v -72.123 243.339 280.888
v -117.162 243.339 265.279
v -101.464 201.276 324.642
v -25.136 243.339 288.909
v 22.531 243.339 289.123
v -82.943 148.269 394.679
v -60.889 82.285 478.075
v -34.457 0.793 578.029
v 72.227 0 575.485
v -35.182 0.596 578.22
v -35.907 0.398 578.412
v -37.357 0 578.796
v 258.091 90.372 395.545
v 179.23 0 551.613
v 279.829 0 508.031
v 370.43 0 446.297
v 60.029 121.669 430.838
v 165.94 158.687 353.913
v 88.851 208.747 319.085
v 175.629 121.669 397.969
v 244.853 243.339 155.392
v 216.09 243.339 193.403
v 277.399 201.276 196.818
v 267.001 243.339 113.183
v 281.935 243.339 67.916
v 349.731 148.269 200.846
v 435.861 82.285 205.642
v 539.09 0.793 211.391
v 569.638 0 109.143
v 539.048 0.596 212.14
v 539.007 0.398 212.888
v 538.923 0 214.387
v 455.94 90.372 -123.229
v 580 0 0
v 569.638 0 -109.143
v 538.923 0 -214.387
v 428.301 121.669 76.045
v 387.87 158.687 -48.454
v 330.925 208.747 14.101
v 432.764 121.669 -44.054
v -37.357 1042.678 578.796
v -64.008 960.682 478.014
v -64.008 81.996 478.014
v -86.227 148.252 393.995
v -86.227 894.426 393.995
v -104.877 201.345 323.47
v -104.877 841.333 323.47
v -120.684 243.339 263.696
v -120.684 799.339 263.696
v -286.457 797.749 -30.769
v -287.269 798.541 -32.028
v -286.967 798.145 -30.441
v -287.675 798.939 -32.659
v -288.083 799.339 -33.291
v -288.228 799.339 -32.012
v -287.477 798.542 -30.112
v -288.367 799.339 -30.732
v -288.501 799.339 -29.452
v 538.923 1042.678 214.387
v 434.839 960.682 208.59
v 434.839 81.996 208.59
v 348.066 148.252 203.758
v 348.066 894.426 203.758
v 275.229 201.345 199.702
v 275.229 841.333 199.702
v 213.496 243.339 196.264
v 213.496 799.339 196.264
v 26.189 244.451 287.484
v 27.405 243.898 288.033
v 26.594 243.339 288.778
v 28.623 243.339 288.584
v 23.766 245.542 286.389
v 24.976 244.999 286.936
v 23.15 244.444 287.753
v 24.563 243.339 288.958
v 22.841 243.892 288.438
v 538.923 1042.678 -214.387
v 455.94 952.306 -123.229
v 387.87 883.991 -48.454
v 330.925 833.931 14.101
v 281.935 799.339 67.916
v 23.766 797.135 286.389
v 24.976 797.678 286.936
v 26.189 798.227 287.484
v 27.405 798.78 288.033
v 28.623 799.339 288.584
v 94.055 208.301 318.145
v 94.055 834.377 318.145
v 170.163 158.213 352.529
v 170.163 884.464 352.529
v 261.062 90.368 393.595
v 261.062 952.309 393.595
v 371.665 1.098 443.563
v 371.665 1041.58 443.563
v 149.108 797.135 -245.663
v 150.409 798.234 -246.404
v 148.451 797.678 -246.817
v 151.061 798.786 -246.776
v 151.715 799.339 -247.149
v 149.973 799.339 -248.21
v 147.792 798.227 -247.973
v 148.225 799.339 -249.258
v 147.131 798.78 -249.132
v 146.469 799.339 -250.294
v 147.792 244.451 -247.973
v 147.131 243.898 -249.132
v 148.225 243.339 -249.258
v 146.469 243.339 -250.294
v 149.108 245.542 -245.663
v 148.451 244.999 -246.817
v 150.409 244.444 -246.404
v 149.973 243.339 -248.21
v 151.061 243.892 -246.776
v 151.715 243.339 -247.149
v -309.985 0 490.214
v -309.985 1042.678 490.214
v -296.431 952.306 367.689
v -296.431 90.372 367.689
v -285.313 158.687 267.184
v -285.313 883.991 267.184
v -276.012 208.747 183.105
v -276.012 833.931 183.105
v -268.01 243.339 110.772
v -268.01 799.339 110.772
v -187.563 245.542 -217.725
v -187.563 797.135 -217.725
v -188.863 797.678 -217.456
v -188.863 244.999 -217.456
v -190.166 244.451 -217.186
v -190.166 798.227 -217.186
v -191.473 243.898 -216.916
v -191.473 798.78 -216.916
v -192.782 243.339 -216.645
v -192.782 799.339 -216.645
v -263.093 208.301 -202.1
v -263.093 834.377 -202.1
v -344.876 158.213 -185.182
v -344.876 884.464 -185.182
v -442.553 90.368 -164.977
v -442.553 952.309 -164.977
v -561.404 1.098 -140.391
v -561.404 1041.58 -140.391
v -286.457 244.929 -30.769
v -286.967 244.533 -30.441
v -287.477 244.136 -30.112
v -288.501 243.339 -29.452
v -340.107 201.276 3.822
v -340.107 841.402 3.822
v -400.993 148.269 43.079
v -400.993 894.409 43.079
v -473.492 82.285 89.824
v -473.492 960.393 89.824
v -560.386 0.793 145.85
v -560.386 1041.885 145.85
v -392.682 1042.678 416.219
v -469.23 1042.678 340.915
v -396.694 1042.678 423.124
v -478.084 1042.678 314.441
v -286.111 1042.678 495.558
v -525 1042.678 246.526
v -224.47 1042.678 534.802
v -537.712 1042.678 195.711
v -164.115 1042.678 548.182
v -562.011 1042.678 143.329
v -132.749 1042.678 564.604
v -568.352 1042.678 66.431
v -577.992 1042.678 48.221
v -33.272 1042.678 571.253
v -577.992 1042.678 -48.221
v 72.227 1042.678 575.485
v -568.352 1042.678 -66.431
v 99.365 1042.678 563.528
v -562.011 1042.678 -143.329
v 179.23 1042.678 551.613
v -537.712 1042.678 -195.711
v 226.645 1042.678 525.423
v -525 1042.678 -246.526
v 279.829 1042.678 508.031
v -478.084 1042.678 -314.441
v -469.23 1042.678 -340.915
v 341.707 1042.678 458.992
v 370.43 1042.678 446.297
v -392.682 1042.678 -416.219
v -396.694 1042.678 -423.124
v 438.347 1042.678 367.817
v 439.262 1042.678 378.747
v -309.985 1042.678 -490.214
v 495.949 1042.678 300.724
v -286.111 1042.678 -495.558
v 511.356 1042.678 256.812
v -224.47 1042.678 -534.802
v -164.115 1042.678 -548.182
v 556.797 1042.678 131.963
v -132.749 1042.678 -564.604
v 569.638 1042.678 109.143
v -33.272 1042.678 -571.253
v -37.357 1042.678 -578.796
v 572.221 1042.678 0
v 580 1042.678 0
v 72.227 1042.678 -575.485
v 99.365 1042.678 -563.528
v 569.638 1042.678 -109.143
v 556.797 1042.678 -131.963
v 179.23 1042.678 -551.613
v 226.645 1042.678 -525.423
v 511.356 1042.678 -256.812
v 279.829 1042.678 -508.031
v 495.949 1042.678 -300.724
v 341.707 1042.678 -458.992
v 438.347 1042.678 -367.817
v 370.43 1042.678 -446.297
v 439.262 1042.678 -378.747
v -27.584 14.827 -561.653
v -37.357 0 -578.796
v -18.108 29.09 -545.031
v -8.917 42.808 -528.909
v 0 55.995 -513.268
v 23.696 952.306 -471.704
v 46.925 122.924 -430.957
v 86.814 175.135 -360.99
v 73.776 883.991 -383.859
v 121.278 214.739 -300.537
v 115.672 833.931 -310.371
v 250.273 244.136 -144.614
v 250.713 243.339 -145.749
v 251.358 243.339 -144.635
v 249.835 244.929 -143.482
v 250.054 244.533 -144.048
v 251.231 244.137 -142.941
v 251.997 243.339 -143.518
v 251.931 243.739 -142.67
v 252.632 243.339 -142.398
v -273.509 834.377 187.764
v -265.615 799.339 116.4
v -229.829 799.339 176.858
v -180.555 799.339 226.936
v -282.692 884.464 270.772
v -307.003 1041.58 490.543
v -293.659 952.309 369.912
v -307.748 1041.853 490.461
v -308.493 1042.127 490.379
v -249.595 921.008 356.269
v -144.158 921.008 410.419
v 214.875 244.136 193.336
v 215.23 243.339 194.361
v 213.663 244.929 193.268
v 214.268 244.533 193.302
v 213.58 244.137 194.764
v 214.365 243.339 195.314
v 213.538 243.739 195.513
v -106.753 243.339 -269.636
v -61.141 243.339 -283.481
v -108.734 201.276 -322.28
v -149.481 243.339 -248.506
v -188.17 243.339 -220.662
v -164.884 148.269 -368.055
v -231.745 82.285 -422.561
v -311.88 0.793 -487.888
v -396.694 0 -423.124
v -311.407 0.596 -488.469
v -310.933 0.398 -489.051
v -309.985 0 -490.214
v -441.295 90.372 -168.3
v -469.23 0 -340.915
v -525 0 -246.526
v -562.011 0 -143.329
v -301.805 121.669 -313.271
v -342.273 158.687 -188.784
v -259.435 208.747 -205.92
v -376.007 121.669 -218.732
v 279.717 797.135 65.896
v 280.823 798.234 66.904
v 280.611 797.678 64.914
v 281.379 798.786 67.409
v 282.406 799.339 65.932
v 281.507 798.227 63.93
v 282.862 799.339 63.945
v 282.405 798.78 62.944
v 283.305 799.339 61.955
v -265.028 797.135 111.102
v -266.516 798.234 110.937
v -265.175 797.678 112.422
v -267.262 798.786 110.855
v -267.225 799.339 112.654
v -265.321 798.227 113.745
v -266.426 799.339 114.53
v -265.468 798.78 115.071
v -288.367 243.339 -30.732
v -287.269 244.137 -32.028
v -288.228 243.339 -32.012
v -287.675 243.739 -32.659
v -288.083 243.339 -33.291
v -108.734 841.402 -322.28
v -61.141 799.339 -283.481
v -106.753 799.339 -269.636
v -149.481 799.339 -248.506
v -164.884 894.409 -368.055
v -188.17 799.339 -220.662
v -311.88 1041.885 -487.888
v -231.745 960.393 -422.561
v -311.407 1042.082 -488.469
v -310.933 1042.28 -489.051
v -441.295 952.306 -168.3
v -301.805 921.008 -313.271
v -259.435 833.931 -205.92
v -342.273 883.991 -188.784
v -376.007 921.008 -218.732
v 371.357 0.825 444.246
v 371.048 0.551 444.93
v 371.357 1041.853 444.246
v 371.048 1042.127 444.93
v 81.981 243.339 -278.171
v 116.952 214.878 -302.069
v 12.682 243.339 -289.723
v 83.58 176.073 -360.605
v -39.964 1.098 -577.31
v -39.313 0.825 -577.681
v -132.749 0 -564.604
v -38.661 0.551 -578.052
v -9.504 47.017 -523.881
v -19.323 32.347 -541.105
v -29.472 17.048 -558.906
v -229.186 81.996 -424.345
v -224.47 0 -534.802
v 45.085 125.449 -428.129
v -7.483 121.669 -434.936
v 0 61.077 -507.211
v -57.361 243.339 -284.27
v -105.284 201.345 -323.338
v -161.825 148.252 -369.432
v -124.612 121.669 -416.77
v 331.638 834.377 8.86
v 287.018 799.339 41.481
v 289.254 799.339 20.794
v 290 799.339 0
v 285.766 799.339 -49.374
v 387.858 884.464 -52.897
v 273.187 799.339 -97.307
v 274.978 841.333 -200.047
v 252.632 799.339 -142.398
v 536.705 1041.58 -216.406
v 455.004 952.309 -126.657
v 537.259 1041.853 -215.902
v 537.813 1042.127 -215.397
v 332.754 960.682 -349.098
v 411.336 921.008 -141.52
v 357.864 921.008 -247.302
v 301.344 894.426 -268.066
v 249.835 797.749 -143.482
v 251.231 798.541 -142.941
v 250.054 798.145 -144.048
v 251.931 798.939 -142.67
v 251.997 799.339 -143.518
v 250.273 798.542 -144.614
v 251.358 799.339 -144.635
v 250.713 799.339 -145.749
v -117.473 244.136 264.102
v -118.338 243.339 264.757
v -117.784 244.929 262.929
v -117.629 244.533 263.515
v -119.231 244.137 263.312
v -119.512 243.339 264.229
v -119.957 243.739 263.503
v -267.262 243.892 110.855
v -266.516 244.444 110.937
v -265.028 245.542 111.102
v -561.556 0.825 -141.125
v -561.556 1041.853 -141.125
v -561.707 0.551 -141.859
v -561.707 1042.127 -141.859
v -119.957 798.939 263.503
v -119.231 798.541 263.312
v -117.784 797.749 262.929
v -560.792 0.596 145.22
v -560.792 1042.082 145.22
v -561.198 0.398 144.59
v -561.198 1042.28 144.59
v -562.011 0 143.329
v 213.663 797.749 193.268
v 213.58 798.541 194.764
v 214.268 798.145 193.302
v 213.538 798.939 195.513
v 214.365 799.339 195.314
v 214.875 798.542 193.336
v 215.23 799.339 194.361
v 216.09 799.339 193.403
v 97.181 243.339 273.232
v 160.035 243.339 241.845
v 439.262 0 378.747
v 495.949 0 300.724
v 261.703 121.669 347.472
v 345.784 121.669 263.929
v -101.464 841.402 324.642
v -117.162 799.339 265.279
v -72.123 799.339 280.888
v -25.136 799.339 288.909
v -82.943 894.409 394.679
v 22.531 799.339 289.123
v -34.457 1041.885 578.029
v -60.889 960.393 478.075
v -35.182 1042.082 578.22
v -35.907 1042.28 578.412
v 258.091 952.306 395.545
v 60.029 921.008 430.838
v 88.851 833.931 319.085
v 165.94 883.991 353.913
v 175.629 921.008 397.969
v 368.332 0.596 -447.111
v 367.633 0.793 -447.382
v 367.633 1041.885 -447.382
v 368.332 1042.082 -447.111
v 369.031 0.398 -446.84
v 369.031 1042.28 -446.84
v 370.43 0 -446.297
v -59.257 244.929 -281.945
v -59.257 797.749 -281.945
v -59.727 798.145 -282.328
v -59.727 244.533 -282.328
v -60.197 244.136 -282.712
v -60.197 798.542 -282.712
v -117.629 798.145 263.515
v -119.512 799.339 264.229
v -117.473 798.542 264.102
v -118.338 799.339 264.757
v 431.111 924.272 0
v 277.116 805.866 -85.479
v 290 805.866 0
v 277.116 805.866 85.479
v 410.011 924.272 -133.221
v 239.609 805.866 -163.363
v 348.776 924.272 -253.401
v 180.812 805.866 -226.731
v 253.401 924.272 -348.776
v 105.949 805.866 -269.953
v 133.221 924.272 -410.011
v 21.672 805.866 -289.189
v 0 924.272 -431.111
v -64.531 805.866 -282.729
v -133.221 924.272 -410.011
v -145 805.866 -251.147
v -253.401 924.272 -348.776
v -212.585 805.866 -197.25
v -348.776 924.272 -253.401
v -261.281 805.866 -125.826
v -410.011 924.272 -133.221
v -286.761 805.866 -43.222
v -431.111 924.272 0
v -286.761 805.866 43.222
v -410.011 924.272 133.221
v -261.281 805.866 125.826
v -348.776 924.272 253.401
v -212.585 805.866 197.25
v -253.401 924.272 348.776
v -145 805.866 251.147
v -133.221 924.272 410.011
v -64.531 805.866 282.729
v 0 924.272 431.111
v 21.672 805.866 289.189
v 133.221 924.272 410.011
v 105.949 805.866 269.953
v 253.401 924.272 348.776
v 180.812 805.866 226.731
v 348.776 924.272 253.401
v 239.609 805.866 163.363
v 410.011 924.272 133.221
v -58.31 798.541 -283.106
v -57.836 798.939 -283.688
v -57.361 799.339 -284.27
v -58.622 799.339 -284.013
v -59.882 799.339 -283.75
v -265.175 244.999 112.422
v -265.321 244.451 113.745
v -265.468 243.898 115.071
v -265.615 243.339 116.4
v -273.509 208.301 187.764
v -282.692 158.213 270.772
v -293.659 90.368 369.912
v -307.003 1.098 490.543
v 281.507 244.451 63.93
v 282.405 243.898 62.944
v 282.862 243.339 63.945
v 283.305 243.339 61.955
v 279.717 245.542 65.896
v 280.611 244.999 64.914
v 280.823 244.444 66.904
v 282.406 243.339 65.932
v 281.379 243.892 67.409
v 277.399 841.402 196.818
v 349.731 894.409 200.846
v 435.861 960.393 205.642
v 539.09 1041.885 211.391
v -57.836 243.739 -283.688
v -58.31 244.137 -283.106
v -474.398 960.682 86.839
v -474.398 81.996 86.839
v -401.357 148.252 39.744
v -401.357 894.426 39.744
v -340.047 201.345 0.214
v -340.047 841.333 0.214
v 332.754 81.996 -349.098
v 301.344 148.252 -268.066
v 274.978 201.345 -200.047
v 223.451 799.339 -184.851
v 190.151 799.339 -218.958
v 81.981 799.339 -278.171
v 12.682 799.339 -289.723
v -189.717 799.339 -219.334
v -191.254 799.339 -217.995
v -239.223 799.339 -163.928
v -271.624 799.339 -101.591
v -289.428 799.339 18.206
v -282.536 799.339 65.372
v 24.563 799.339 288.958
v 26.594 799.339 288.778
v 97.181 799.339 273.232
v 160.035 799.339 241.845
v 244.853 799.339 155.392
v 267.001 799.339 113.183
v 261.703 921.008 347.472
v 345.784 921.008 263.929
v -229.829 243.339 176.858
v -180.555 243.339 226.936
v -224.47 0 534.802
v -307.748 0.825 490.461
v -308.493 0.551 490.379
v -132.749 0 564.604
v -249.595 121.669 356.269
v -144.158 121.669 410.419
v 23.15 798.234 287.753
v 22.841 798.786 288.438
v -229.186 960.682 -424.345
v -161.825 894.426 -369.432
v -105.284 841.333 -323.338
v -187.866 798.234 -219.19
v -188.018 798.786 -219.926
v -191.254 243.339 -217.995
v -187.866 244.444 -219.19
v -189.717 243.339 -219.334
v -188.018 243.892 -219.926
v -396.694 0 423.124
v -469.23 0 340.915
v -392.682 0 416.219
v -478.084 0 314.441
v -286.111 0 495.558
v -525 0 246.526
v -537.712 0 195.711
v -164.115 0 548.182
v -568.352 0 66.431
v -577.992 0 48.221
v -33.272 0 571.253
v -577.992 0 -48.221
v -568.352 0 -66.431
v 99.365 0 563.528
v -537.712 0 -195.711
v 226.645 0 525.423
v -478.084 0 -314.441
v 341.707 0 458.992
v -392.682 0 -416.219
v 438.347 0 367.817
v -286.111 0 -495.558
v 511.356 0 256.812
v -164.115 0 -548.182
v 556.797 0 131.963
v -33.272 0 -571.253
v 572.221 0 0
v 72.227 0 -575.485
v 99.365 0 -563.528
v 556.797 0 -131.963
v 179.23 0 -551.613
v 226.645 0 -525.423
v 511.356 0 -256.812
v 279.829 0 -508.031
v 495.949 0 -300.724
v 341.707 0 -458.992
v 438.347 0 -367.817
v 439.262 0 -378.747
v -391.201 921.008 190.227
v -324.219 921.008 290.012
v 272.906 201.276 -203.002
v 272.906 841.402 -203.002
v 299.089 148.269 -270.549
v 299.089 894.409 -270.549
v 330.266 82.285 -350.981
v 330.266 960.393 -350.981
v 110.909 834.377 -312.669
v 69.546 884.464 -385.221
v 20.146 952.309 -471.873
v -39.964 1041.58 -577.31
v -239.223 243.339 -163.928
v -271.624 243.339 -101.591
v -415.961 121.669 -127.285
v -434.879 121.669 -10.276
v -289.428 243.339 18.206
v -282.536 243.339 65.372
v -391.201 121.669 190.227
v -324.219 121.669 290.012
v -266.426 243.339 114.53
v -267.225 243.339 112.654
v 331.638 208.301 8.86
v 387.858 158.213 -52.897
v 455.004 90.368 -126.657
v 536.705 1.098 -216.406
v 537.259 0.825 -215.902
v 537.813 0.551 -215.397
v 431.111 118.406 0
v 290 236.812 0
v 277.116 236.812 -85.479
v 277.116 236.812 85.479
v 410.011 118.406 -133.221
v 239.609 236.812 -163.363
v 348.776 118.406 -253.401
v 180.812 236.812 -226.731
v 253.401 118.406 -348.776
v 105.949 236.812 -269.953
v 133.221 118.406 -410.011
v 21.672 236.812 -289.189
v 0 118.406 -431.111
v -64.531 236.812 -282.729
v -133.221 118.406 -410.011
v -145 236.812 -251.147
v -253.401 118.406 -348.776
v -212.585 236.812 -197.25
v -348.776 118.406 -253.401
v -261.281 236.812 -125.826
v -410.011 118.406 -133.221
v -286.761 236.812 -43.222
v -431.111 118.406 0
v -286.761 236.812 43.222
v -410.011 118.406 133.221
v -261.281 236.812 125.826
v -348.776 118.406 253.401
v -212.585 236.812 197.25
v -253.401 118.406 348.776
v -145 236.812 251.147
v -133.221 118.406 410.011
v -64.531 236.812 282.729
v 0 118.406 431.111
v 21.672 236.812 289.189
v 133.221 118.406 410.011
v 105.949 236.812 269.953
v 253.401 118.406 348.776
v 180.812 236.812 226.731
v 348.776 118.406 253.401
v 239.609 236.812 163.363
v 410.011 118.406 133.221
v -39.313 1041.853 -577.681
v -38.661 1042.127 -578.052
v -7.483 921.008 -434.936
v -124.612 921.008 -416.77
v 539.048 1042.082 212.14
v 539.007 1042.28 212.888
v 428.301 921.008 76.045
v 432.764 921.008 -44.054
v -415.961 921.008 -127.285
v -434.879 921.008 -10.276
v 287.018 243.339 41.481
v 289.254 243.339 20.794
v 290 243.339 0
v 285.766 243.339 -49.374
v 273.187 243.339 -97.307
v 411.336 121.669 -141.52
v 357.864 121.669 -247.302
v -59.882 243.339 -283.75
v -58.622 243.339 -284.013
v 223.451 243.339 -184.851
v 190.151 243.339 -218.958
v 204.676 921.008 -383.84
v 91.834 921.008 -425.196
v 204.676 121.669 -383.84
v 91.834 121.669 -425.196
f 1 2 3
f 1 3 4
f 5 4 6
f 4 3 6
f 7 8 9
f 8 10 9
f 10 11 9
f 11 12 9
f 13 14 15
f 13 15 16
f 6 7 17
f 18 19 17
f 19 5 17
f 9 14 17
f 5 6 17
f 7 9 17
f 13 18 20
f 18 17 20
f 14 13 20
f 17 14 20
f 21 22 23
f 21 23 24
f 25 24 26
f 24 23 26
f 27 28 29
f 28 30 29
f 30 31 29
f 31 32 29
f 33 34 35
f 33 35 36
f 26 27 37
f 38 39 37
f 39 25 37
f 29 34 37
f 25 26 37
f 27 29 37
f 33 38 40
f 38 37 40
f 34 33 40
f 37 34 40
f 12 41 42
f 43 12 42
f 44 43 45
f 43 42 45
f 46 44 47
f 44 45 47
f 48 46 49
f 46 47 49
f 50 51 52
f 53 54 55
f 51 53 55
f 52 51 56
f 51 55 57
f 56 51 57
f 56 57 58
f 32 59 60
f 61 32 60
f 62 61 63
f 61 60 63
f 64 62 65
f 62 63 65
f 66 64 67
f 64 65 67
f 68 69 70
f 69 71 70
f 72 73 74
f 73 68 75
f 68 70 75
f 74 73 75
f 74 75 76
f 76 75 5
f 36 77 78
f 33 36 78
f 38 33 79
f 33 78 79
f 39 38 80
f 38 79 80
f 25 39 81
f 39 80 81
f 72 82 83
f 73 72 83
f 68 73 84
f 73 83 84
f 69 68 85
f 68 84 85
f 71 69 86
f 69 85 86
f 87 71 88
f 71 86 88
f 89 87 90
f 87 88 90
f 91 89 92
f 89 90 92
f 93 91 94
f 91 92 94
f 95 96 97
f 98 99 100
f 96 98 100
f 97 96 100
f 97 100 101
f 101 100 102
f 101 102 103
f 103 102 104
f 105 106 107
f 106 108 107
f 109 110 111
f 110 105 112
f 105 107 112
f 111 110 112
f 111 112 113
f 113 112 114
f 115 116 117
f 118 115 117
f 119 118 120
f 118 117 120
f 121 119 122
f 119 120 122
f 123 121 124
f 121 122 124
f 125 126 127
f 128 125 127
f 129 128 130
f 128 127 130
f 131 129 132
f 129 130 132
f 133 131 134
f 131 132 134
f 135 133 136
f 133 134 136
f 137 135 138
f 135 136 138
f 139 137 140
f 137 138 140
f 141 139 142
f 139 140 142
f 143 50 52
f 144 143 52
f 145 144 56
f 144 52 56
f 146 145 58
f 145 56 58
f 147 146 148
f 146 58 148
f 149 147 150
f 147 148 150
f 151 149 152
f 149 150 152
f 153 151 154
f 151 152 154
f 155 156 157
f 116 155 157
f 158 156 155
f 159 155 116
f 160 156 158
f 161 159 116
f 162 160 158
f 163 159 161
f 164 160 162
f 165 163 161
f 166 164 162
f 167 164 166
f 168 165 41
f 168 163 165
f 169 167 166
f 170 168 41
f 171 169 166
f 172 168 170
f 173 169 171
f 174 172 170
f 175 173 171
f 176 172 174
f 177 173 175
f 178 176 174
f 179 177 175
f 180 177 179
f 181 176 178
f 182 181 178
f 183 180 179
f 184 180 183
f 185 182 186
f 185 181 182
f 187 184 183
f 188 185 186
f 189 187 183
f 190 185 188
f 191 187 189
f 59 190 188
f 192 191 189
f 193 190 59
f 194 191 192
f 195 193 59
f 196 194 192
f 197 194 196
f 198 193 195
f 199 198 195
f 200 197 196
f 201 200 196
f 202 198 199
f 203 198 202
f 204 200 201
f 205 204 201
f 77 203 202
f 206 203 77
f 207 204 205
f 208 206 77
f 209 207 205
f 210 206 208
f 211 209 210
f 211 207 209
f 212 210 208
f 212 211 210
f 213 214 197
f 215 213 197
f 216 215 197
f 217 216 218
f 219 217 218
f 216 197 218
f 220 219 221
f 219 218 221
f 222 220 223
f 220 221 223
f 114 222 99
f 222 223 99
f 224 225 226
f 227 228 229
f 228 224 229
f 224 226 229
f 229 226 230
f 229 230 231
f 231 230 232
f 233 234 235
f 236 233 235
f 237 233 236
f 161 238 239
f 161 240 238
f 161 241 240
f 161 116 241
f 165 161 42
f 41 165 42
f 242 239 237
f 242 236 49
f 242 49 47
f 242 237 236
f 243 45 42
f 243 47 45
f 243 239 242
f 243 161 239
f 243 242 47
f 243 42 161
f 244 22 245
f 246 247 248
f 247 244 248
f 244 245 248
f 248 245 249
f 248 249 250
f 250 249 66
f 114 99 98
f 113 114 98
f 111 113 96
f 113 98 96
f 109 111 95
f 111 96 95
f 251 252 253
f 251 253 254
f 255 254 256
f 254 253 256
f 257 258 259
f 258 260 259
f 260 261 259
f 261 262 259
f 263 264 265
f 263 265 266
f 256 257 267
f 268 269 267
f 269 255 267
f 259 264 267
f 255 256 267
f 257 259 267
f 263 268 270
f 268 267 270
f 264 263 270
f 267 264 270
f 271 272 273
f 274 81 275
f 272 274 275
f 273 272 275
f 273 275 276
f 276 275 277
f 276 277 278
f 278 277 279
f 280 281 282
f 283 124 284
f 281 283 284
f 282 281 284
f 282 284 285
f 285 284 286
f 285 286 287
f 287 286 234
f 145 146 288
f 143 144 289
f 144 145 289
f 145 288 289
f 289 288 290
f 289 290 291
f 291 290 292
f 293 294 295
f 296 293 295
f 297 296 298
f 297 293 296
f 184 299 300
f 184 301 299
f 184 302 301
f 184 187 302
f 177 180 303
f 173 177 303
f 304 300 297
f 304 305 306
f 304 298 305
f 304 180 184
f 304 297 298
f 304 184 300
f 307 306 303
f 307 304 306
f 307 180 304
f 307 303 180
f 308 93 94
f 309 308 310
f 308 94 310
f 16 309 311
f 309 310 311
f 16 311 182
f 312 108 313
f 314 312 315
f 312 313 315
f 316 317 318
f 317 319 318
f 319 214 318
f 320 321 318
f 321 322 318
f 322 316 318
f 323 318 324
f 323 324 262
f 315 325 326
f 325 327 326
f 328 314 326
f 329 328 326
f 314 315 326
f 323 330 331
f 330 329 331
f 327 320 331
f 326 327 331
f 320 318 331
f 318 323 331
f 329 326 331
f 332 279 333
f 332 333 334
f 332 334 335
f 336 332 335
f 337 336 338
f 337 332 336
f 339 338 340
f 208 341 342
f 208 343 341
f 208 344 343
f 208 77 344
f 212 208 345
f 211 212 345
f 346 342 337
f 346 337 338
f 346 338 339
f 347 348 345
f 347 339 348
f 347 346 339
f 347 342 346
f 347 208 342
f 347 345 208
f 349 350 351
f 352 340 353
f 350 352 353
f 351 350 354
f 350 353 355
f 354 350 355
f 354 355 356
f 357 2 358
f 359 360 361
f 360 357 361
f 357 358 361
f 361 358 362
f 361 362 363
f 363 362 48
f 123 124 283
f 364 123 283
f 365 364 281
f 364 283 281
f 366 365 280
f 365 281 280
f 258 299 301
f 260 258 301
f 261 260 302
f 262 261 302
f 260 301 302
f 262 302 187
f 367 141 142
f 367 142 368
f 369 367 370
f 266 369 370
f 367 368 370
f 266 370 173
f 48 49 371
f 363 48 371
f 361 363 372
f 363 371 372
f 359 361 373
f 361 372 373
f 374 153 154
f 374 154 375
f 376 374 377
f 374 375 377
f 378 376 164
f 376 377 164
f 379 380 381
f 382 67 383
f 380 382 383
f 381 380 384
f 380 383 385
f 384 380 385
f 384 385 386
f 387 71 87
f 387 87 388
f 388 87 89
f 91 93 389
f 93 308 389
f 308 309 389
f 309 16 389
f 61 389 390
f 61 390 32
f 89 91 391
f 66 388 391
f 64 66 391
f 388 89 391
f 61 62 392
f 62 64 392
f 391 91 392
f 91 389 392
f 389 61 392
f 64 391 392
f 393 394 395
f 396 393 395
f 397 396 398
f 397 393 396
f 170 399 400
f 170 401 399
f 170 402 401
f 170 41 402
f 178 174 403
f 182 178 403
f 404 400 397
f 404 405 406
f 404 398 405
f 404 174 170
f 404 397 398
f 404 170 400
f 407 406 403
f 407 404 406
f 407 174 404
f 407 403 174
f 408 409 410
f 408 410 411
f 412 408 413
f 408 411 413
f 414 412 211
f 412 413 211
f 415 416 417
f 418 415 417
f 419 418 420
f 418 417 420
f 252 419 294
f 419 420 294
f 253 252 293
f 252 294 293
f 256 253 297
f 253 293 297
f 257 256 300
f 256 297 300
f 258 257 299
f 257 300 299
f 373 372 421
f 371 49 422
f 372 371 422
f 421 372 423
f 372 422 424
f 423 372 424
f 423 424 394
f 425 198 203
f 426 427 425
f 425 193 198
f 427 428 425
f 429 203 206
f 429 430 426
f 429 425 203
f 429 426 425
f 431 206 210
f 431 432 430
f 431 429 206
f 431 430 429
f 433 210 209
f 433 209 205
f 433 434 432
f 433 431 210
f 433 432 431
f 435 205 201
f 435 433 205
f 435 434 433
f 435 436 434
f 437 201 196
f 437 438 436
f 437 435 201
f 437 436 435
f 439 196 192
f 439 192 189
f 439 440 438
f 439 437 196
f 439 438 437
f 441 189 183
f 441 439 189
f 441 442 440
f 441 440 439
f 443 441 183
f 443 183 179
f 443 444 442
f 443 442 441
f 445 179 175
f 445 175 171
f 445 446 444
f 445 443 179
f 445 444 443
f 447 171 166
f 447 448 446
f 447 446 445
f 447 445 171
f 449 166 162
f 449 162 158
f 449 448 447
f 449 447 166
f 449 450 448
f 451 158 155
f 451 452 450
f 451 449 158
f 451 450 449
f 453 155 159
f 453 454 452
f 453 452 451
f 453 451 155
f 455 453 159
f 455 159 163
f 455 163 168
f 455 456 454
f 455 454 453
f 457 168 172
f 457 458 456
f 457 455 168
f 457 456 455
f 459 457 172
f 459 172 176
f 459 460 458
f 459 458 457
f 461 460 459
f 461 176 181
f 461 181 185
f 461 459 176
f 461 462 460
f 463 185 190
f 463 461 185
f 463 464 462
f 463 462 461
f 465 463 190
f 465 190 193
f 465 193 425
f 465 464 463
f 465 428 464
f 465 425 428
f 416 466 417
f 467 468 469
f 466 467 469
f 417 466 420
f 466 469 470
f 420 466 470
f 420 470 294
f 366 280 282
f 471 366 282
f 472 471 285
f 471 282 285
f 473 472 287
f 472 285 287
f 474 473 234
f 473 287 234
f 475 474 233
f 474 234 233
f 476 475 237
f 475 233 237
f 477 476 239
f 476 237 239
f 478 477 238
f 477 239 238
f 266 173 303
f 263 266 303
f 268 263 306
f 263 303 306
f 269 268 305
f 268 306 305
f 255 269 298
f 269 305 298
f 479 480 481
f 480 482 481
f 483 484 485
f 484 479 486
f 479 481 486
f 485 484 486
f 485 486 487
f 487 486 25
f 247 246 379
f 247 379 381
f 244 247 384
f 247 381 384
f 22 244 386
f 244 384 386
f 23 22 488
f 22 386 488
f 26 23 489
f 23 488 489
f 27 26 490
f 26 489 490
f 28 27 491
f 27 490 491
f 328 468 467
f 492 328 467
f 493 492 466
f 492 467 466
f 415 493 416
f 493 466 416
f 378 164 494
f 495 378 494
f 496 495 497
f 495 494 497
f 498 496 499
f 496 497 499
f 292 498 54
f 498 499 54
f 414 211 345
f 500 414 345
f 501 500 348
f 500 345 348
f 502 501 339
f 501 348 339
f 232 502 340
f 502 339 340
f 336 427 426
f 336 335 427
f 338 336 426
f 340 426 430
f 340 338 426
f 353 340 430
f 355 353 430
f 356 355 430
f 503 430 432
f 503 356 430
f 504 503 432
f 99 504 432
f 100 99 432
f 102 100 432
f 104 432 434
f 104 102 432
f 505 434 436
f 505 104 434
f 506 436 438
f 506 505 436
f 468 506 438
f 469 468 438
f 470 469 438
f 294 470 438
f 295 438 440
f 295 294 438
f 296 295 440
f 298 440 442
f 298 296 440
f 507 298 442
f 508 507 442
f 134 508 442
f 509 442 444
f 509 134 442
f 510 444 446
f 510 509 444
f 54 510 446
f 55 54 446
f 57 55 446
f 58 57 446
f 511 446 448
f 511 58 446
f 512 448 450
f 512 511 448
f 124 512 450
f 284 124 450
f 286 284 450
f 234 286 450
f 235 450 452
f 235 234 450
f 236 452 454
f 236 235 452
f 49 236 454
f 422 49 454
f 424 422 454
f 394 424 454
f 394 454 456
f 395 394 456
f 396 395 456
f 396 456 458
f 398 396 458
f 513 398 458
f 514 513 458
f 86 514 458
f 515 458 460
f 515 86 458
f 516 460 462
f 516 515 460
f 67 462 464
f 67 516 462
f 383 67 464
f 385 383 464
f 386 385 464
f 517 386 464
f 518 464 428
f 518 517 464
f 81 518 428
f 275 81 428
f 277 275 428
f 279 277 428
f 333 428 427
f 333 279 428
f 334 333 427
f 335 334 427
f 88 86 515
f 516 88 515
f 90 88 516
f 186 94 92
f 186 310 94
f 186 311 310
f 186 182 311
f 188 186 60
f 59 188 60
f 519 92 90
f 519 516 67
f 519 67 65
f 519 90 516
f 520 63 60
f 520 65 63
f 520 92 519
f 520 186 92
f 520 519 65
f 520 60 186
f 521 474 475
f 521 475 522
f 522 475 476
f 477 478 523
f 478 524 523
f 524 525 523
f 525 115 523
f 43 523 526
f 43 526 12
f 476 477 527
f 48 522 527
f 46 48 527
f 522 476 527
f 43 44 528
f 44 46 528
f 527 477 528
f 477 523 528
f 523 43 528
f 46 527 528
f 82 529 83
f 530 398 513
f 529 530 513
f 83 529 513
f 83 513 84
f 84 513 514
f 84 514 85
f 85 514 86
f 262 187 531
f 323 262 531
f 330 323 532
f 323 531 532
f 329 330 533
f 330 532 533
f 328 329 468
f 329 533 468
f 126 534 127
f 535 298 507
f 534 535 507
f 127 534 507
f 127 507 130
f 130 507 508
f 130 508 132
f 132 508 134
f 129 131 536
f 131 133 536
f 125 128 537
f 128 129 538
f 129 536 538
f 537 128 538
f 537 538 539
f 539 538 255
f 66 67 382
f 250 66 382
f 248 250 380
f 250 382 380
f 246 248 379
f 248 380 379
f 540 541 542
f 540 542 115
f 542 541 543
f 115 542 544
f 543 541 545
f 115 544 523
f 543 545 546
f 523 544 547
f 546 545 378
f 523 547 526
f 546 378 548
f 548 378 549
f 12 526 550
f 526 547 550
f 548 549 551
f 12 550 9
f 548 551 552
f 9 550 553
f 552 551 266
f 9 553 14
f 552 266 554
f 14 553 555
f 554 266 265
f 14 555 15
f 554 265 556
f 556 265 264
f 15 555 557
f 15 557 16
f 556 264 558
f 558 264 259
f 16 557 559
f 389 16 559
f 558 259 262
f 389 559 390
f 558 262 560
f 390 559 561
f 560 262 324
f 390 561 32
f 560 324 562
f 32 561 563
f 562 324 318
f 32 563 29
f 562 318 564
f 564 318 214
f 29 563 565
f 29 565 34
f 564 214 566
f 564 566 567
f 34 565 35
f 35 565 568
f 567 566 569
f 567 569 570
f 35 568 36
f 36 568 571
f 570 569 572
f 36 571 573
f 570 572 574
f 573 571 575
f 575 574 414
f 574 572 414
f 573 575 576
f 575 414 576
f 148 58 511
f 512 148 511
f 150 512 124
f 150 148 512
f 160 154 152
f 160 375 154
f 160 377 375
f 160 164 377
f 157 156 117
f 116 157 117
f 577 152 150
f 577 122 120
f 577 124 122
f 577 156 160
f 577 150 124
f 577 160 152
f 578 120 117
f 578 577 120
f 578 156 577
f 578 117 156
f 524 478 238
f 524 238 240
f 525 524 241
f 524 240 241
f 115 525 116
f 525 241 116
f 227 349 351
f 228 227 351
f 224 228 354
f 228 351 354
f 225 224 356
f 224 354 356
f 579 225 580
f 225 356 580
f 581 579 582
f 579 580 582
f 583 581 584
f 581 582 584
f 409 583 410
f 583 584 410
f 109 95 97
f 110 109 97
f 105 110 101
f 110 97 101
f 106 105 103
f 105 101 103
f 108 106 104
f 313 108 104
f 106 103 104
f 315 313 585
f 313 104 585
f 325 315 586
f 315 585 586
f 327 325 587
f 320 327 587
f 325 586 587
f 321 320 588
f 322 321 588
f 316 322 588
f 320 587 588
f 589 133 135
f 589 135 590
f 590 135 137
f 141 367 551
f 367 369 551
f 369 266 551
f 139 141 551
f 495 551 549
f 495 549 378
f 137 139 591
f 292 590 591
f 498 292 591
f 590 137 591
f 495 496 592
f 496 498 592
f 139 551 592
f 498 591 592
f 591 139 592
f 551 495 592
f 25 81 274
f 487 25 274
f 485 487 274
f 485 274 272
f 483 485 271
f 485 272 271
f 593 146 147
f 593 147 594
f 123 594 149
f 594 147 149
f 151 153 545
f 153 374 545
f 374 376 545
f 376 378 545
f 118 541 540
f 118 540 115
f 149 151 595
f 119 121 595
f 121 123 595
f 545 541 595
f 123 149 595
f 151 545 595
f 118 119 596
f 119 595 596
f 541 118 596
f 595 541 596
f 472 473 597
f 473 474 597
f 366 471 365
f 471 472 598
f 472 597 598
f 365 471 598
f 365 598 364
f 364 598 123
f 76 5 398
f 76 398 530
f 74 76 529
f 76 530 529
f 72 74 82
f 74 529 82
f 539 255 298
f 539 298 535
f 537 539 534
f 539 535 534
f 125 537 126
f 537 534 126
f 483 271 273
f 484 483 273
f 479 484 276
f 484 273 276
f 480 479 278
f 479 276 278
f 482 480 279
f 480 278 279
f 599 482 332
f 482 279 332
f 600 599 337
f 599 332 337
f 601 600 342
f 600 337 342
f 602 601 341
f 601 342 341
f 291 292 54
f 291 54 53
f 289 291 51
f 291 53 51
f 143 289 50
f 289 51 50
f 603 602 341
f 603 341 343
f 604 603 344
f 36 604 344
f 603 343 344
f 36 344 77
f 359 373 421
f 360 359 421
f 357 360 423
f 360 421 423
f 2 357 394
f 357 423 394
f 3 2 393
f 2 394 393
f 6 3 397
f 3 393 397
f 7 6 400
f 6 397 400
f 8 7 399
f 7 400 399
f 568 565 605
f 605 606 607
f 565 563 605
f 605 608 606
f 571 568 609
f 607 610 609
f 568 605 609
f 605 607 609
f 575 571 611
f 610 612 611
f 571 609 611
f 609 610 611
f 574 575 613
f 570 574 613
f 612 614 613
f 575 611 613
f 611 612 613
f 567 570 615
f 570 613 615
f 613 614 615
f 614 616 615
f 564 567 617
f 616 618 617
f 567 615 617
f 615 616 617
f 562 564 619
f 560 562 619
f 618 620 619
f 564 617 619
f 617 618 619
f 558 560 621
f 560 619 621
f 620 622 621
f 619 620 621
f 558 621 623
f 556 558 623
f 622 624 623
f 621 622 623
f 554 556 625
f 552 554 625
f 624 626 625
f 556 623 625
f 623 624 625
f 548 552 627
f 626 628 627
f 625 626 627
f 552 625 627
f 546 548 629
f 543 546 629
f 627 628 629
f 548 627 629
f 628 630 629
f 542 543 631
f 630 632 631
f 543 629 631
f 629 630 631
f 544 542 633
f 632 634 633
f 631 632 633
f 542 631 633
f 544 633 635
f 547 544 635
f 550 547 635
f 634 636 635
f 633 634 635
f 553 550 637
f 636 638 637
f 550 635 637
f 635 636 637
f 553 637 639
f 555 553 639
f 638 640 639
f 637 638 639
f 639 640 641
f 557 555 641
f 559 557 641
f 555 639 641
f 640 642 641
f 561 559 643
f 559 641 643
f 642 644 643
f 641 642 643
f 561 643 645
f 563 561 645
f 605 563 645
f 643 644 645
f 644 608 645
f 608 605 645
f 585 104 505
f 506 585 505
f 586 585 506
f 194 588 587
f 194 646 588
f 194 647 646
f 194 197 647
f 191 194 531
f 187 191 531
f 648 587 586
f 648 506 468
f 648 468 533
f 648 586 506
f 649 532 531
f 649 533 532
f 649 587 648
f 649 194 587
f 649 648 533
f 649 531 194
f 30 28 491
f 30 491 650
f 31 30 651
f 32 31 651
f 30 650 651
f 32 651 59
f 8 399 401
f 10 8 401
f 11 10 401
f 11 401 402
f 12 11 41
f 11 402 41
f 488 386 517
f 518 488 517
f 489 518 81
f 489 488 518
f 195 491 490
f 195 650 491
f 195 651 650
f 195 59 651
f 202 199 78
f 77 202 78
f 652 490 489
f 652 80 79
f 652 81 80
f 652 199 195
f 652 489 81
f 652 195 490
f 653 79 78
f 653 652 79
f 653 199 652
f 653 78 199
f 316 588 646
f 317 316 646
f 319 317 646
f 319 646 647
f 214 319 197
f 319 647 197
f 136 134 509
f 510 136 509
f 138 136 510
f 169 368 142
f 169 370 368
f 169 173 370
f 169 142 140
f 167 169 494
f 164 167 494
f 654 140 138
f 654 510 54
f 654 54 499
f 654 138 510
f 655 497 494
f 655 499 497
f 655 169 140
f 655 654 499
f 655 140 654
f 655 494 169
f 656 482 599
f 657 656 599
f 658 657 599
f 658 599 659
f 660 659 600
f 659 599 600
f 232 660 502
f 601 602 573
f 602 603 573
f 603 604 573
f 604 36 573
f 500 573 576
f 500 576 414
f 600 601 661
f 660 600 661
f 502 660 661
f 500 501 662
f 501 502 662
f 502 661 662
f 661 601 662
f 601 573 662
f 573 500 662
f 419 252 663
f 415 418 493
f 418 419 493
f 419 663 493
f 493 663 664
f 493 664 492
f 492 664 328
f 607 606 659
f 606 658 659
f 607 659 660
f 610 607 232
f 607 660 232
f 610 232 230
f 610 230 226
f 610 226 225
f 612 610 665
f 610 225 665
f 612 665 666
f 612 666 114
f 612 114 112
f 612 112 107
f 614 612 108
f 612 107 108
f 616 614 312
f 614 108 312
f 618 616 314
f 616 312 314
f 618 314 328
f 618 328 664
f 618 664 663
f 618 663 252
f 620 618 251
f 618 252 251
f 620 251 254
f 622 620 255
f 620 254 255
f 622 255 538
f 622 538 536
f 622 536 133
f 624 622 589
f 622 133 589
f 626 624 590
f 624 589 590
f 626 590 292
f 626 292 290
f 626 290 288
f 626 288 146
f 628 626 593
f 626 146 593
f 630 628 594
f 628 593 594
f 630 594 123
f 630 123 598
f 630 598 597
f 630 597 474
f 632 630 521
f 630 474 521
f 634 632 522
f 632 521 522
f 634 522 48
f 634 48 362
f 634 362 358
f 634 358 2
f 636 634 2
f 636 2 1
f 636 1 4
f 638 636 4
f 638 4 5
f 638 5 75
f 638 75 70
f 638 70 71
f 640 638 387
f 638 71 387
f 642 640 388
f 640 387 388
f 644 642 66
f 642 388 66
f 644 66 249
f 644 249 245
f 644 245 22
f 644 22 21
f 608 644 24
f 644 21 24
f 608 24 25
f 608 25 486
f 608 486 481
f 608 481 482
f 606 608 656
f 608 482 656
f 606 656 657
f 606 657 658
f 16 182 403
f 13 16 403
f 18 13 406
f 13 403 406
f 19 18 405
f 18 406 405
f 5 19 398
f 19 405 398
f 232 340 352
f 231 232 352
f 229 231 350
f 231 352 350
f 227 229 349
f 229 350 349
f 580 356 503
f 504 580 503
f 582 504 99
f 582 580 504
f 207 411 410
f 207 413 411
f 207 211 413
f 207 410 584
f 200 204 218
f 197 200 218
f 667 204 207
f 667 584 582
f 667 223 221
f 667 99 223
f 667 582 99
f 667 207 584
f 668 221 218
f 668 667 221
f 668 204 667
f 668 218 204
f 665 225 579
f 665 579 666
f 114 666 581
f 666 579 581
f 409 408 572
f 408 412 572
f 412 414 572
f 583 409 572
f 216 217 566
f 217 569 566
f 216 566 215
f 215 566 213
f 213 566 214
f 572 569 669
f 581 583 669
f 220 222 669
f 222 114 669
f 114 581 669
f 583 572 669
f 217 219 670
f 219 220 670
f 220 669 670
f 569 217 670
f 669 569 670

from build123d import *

# Parameters (mm, degrees)
SALIENTE_EXTRUIR1_REACH             = 1008.239
SALIENTE_EXTRUIR1_DIRECTION_2_REACH = 1008.239


with BuildPart() as part:
    # Croquis2 → Revolución1 (revolve)
    with BuildSketch(Plane.XY, mode=Mode.PRIVATE) as revoluci_n1_sk:
        Polygon((-572.221380866, 0), (-290, 236.811856595), (-290, 243.338893041), (-580, 0), align=None)
        Polygon((-290, 799.338893041), (-580, 1042.677786083), (-572.221380866, 1042.677786083), (-290, 805.865929488), align=None)
    revolve(revoluci_n1_sk.sketch.rotate(Axis((0, 243.338893041, 0), (0, 1, 0)), 180), axis=Axis((0, 243.338893041, 0), (0, 1, 0)))

    # Saliente-Extruir1: up to this cone (the profile starts outside it)
    saliente_extruir1_end = Plane(origin=(0, 459.825, 0), z_dir=(0, 1, 0)).offset(96.175001) * Cone(1.192e-06, 1087.551425472, 912.563999, align=(Align.CENTER, Align.CENTER, Align.MIN), mode=Mode.PRIVATE)
    # Croquis3 → Saliente-Extruir1 (add, up to the surface)
    with BuildSketch(Plane(origin=(0, 459.825, 0), x_dir=(1, 0, 0), z_dir=(0, 1, 0)), mode=Mode.PRIVATE) as saliente_extruir1_sk1:
        Polygon((-562.011449548, 143.32875), (-188.170333372, 220.662469937), (-187.562612401, 217.724668851), (-561.403728577, 140.390948914), align=None)
    saliente_extruir1_tool1 = extrude(saliente_extruir1_sk1.sketch, amount=SALIENTE_EXTRUIR1_REACH, mode=Mode.PRIVATE) - saliente_extruir1_end
    add(saliente_extruir1_tool1.solids().sort_by_distance((-374.787031, 459.825, -180.526709))[0])
    # Croquis3 → Saliente-Extruir1 (add, up to the surface)
    with BuildSketch(Plane(origin=(0, 459.825, 0), x_dir=(1, 0, 0), z_dir=(0, 1, 0)), mode=Mode.PRIVATE) as saliente_extruir1_sk2:
        Polygon((-562.011449548, -143.32875), (-288.082841539, 33.290785673), (-286.457166797, 30.76944047), (-560.385774807, -145.850095203), align=None)
    saliente_extruir1_tool2 = extrude(saliente_extruir1_sk2.sketch, amount=SALIENTE_EXTRUIR1_REACH, mode=Mode.PRIVATE) - saliente_extruir1_end
    add(saliente_extruir1_tool2.solids().sort_by_distance((-424.234308, 459.825, 56.279655))[0])
    # Croquis3 → Saliente-Extruir1 (add, up to the surface)
    with BuildSketch(Plane(origin=(0, 459.825, 0), x_dir=(1, 0, 0), z_dir=(0, 1, 0)), mode=Mode.PRIVATE) as saliente_extruir1_sk3:
        Polygon((151.714649086, 247.149074958), (149.108430327, 245.663267507), (-39.963566042, 577.309863406), (-37.357347284, 578.795670858), align=None)
    saliente_extruir1_tool3 = extrude(saliente_extruir1_sk3.sketch, amount=SALIENTE_EXTRUIR1_REACH, mode=Mode.PRIVATE) - saliente_extruir1_end
    add(saliente_extruir1_tool3.solids().sort_by_distance((55.875542, 459.825, -412.229469))[0])
    # Croquis3 → Saliente-Extruir1 (add, up to the surface)
    with BuildSketch(Plane(origin=(0, 459.825, 0), x_dir=(1, 0, 0), z_dir=(0, 1, 0)), mode=Mode.PRIVATE) as saliente_extruir1_sk4:
        Polygon((-309.984830604, 490.213631793), (-57.361075176, 284.270482208), (-59.256655839, 281.945235135), (-311.880411267, 487.88838472), align=None)
    saliente_extruir1_tool4 = extrude(saliente_extruir1_sk4.sketch, amount=SALIENTE_EXTRUIR1_REACH, mode=Mode.PRIVATE) - saliente_extruir1_end
    add(saliente_extruir1_tool4.solids().sort_by_distance((-184.620743, 459.825, -386.079433))[0])
    # Croquis3 → Saliente-Extruir1 (add, up to the surface)
    with BuildSketch(Plane(origin=(0, 459.825, 0), x_dir=(1, 0, 0), z_dir=(0, 1, 0)), mode=Mode.PRIVATE) as saliente_extruir1_sk5:
        Polygon((281.935143099, -67.915941324), (279.716690352, -65.896419744), (536.704886451, 216.406168711), (538.923339197, 214.386647132), align=None)
    saliente_extruir1_tool5 = extrude(saliente_extruir1_sk5.sketch, amount=SALIENTE_EXTRUIR1_REACH, mode=Mode.PRIVATE) - saliente_extruir1_end
    add(saliente_extruir1_tool5.solids().sort_by_distance((409.320015, 459.825, -74.245114))[0])
    # Croquis3 → Saliente-Extruir1 (add, up to the surface)
    with BuildSketch(Plane(origin=(0, 459.825, 0), x_dir=(1, 0, 0), z_dir=(0, 1, 0)), mode=Mode.PRIVATE) as saliente_extruir1_sk6:
        Polygon((370.430288238, 446.297436197), (252.631747449, 142.398034329), (249.834539429, 143.482297809), (367.633080219, 447.381699677), align=None)
    saliente_extruir1_tool6 = extrude(saliente_extruir1_sk6.sketch, amount=SALIENTE_EXTRUIR1_REACH, mode=Mode.PRIVATE) - saliente_extruir1_end
    add(saliente_extruir1_tool6.solids().sort_by_distance((310.132414, 459.825, -294.889867))[0])
    # Croquis3 → Saliente-Extruir1 (add, up to the surface)
    with BuildSketch(Plane(origin=(0, 459.825, 0), x_dir=(1, 0, 0), z_dir=(0, 1, 0)), mode=Mode.PRIVATE) as saliente_extruir1_sk7:
        Polygon((22.530851972, -289.123435075), (23.765991531, -286.389494645), (371.665427797, -443.563495767), (370.430288238, -446.297436197), align=None)
    saliente_extruir1_tool7 = extrude(saliente_extruir1_sk7.sketch, amount=SALIENTE_EXTRUIR1_REACH, mode=Mode.PRIVATE) - saliente_extruir1_end
    add(saliente_extruir1_tool7.solids().sort_by_distance((197.09814, 459.825, 366.343465))[0])
    # Croquis3 → Saliente-Extruir1 (add, up to the surface)
    with BuildSketch(Plane(origin=(0, 459.825, 0), x_dir=(1, 0, 0), z_dir=(0, 1, 0)), mode=Mode.PRIVATE) as saliente_extruir1_sk8:
        Polygon((538.923339197, -214.386647132), (213.496081737, -196.263657061), (213.66289277, -193.268298305), (539.09015023, -211.391288375), align=None)
    saliente_extruir1_tool8 = extrude(saliente_extruir1_sk8.sketch, amount=SALIENTE_EXTRUIR1_REACH, mode=Mode.PRIVATE) - saliente_extruir1_end
    add(saliente_extruir1_tool8.solids().sort_by_distance((376.293116, 459.825, 203.827473))[0])
    # Croquis3 → Saliente-Extruir1 (add, up to the surface)
    with BuildSketch(Plane(origin=(0, 459.825, 0), x_dir=(1, 0, 0), z_dir=(0, 1, 0)), mode=Mode.PRIVATE) as saliente_extruir1_sk9:
        Polygon((-268.010310784, -110.772168496), (-265.02849981, -111.102021968), (-307.003019629, -490.543485264), (-309.984830604, -490.213631793), align=None)
    saliente_extruir1_tool9 = extrude(saliente_extruir1_sk9.sketch, amount=SALIENTE_EXTRUIR1_REACH, mode=Mode.PRIVATE) - saliente_extruir1_end
    add(saliente_extruir1_tool9.solids().sort_by_distance((-287.506665, 459.825, 300.657827))[0])
    # Croquis3 → Saliente-Extruir1 (add, up to the surface)
    with BuildSketch(Plane(origin=(0, 459.825, 0), x_dir=(1, 0, 0), z_dir=(0, 1, 0)), mode=Mode.PRIVATE) as saliente_extruir1_sk10:
        Polygon((-37.357347284, -578.795670858), (-120.683912471, -263.695645149), (-117.783609563, -262.928675109), (-34.457044376, -578.028700818), align=None)
    saliente_extruir1_tool10 = extrude(saliente_extruir1_sk10.sketch, amount=SALIENTE_EXTRUIR1_REACH, mode=Mode.PRIVATE) - saliente_extruir1_end
    add(saliente_extruir1_tool10.solids().sort_by_distance((-77.570478, 459.825, 420.862173))[0])

    # Saliente-Extruir1 direction 2: up to this cone (the profile starts outside it)
    saliente_extruir1_direction_2_end = Plane(origin=(0, 459.825, 0), z_dir=(0, -1, 0)).offset(-26.852785083) * Cone(1.192e-06, 1272.308615927, 1067.593689368, align=(Align.CENTER, Align.CENTER, Align.MIN), mode=Mode.PRIVATE)
    # Croquis3 → Saliente-Extruir1 direction 2 (add, up to the surface)
    with BuildSketch(Plane(origin=(0, 459.825, 0), x_dir=(1, 0, 0), z_dir=(0, 1, 0)), mode=Mode.PRIVATE) as saliente_extruir1_direction_2_sk1:
        Polygon((-562.011449548, 143.32875), (-188.170333372, 220.662469937), (-187.562612401, 217.724668851), (-561.403728577, 140.390948914), align=None)
    saliente_extruir1_direction_2_tool1 = extrude(saliente_extruir1_direction_2_sk1.sketch, amount=-SALIENTE_EXTRUIR1_DIRECTION_2_REACH, mode=Mode.PRIVATE) - saliente_extruir1_direction_2_end
    add(saliente_extruir1_direction_2_tool1.solids().sort_by_distance((-374.787031, 459.825, -180.526709))[0])
    # Croquis3 → Saliente-Extruir1 direction 2 (add, up to the surface)
    with BuildSketch(Plane(origin=(0, 459.825, 0), x_dir=(1, 0, 0), z_dir=(0, 1, 0)), mode=Mode.PRIVATE) as saliente_extruir1_direction_2_sk2:
        Polygon((-562.011449548, -143.32875), (-288.082841539, 33.290785673), (-286.457166797, 30.76944047), (-560.385774807, -145.850095203), align=None)
    saliente_extruir1_direction_2_tool2 = extrude(saliente_extruir1_direction_2_sk2.sketch, amount=-SALIENTE_EXTRUIR1_DIRECTION_2_REACH, mode=Mode.PRIVATE) - saliente_extruir1_direction_2_end
    add(saliente_extruir1_direction_2_tool2.solids().sort_by_distance((-424.234308, 459.825, 56.279655))[0])
    # Croquis3 → Saliente-Extruir1 direction 2 (add, up to the surface)
    with BuildSketch(Plane(origin=(0, 459.825, 0), x_dir=(1, 0, 0), z_dir=(0, 1, 0)), mode=Mode.PRIVATE) as saliente_extruir1_direction_2_sk3:
        Polygon((151.714649086, 247.149074958), (149.108430327, 245.663267507), (-39.963566042, 577.309863406), (-37.357347284, 578.795670858), align=None)
    saliente_extruir1_direction_2_tool3 = extrude(saliente_extruir1_direction_2_sk3.sketch, amount=-SALIENTE_EXTRUIR1_DIRECTION_2_REACH, mode=Mode.PRIVATE) - saliente_extruir1_direction_2_end
    add(saliente_extruir1_direction_2_tool3.solids().sort_by_distance((55.875542, 459.825, -412.229469))[0])
    # Croquis3 → Saliente-Extruir1 direction 2 (add, up to the surface)
    with BuildSketch(Plane(origin=(0, 459.825, 0), x_dir=(1, 0, 0), z_dir=(0, 1, 0)), mode=Mode.PRIVATE) as saliente_extruir1_direction_2_sk4:
        Polygon((-309.984830604, 490.213631793), (-57.361075176, 284.270482208), (-59.256655839, 281.945235135), (-311.880411267, 487.88838472), align=None)
    saliente_extruir1_direction_2_tool4 = extrude(saliente_extruir1_direction_2_sk4.sketch, amount=-SALIENTE_EXTRUIR1_DIRECTION_2_REACH, mode=Mode.PRIVATE) - saliente_extruir1_direction_2_end
    add(saliente_extruir1_direction_2_tool4.solids().sort_by_distance((-184.620743, 459.825, -386.079433))[0])
    # Croquis3 → Saliente-Extruir1 direction 2 (add, up to the surface)
    with BuildSketch(Plane(origin=(0, 459.825, 0), x_dir=(1, 0, 0), z_dir=(0, 1, 0)), mode=Mode.PRIVATE) as saliente_extruir1_direction_2_sk5:
        Polygon((281.935143099, -67.915941324), (279.716690352, -65.896419744), (536.704886451, 216.406168711), (538.923339197, 214.386647132), align=None)
    saliente_extruir1_direction_2_tool5 = extrude(saliente_extruir1_direction_2_sk5.sketch, amount=-SALIENTE_EXTRUIR1_DIRECTION_2_REACH, mode=Mode.PRIVATE) - saliente_extruir1_direction_2_end
    add(saliente_extruir1_direction_2_tool5.solids().sort_by_distance((409.320015, 459.825, -74.245114))[0])
    # Croquis3 → Saliente-Extruir1 direction 2 (add, up to the surface)
    with BuildSketch(Plane(origin=(0, 459.825, 0), x_dir=(1, 0, 0), z_dir=(0, 1, 0)), mode=Mode.PRIVATE) as saliente_extruir1_direction_2_sk6:
        Polygon((370.430288238, 446.297436197), (252.631747449, 142.398034329), (249.834539429, 143.482297809), (367.633080219, 447.381699677), align=None)
    saliente_extruir1_direction_2_tool6 = extrude(saliente_extruir1_direction_2_sk6.sketch, amount=-SALIENTE_EXTRUIR1_DIRECTION_2_REACH, mode=Mode.PRIVATE) - saliente_extruir1_direction_2_end
    add(saliente_extruir1_direction_2_tool6.solids().sort_by_distance((310.132414, 459.825, -294.889867))[0])
    # Croquis3 → Saliente-Extruir1 direction 2 (add, up to the surface)
    with BuildSketch(Plane(origin=(0, 459.825, 0), x_dir=(1, 0, 0), z_dir=(0, 1, 0)), mode=Mode.PRIVATE) as saliente_extruir1_direction_2_sk7:
        Polygon((22.530851972, -289.123435075), (23.765991531, -286.389494645), (371.665427797, -443.563495767), (370.430288238, -446.297436197), align=None)
    saliente_extruir1_direction_2_tool7 = extrude(saliente_extruir1_direction_2_sk7.sketch, amount=-SALIENTE_EXTRUIR1_DIRECTION_2_REACH, mode=Mode.PRIVATE) - saliente_extruir1_direction_2_end
    add(saliente_extruir1_direction_2_tool7.solids().sort_by_distance((197.09814, 459.825, 366.343465))[0])
    # Croquis3 → Saliente-Extruir1 direction 2 (add, up to the surface)
    with BuildSketch(Plane(origin=(0, 459.825, 0), x_dir=(1, 0, 0), z_dir=(0, 1, 0)), mode=Mode.PRIVATE) as saliente_extruir1_direction_2_sk8:
        Polygon((538.923339197, -214.386647132), (213.496081737, -196.263657061), (213.66289277, -193.268298305), (539.09015023, -211.391288375), align=None)
    saliente_extruir1_direction_2_tool8 = extrude(saliente_extruir1_direction_2_sk8.sketch, amount=-SALIENTE_EXTRUIR1_DIRECTION_2_REACH, mode=Mode.PRIVATE) - saliente_extruir1_direction_2_end
    add(saliente_extruir1_direction_2_tool8.solids().sort_by_distance((376.293116, 459.825, 203.827473))[0])
    # Croquis3 → Saliente-Extruir1 direction 2 (add, up to the surface)
    with BuildSketch(Plane(origin=(0, 459.825, 0), x_dir=(1, 0, 0), z_dir=(0, 1, 0)), mode=Mode.PRIVATE) as saliente_extruir1_direction_2_sk9:
        Polygon((-268.010310784, -110.772168496), (-265.02849981, -111.102021968), (-307.003019629, -490.543485264), (-309.984830604, -490.213631793), align=None)
    saliente_extruir1_direction_2_tool9 = extrude(saliente_extruir1_direction_2_sk9.sketch, amount=-SALIENTE_EXTRUIR1_DIRECTION_2_REACH, mode=Mode.PRIVATE) - saliente_extruir1_direction_2_end
    add(saliente_extruir1_direction_2_tool9.solids().sort_by_distance((-287.506665, 459.825, 300.657827))[0])
    # Croquis3 → Saliente-Extruir1 direction 2 (add, up to the surface)
    with BuildSketch(Plane(origin=(0, 459.825, 0), x_dir=(1, 0, 0), z_dir=(0, 1, 0)), mode=Mode.PRIVATE) as saliente_extruir1_direction_2_sk10:
        Polygon((-37.357347284, -578.795670858), (-120.683912471, -263.695645149), (-117.783609563, -262.928675109), (-34.457044376, -578.028700818), align=None)
    saliente_extruir1_direction_2_tool10 = extrude(saliente_extruir1_direction_2_sk10.sketch, amount=-SALIENTE_EXTRUIR1_DIRECTION_2_REACH, mode=Mode.PRIVATE) - saliente_extruir1_direction_2_end
    add(saliente_extruir1_direction_2_tool10.solids().sort_by_distance((-77.570478, 459.825, 420.862173))[0])


solid = part.part
